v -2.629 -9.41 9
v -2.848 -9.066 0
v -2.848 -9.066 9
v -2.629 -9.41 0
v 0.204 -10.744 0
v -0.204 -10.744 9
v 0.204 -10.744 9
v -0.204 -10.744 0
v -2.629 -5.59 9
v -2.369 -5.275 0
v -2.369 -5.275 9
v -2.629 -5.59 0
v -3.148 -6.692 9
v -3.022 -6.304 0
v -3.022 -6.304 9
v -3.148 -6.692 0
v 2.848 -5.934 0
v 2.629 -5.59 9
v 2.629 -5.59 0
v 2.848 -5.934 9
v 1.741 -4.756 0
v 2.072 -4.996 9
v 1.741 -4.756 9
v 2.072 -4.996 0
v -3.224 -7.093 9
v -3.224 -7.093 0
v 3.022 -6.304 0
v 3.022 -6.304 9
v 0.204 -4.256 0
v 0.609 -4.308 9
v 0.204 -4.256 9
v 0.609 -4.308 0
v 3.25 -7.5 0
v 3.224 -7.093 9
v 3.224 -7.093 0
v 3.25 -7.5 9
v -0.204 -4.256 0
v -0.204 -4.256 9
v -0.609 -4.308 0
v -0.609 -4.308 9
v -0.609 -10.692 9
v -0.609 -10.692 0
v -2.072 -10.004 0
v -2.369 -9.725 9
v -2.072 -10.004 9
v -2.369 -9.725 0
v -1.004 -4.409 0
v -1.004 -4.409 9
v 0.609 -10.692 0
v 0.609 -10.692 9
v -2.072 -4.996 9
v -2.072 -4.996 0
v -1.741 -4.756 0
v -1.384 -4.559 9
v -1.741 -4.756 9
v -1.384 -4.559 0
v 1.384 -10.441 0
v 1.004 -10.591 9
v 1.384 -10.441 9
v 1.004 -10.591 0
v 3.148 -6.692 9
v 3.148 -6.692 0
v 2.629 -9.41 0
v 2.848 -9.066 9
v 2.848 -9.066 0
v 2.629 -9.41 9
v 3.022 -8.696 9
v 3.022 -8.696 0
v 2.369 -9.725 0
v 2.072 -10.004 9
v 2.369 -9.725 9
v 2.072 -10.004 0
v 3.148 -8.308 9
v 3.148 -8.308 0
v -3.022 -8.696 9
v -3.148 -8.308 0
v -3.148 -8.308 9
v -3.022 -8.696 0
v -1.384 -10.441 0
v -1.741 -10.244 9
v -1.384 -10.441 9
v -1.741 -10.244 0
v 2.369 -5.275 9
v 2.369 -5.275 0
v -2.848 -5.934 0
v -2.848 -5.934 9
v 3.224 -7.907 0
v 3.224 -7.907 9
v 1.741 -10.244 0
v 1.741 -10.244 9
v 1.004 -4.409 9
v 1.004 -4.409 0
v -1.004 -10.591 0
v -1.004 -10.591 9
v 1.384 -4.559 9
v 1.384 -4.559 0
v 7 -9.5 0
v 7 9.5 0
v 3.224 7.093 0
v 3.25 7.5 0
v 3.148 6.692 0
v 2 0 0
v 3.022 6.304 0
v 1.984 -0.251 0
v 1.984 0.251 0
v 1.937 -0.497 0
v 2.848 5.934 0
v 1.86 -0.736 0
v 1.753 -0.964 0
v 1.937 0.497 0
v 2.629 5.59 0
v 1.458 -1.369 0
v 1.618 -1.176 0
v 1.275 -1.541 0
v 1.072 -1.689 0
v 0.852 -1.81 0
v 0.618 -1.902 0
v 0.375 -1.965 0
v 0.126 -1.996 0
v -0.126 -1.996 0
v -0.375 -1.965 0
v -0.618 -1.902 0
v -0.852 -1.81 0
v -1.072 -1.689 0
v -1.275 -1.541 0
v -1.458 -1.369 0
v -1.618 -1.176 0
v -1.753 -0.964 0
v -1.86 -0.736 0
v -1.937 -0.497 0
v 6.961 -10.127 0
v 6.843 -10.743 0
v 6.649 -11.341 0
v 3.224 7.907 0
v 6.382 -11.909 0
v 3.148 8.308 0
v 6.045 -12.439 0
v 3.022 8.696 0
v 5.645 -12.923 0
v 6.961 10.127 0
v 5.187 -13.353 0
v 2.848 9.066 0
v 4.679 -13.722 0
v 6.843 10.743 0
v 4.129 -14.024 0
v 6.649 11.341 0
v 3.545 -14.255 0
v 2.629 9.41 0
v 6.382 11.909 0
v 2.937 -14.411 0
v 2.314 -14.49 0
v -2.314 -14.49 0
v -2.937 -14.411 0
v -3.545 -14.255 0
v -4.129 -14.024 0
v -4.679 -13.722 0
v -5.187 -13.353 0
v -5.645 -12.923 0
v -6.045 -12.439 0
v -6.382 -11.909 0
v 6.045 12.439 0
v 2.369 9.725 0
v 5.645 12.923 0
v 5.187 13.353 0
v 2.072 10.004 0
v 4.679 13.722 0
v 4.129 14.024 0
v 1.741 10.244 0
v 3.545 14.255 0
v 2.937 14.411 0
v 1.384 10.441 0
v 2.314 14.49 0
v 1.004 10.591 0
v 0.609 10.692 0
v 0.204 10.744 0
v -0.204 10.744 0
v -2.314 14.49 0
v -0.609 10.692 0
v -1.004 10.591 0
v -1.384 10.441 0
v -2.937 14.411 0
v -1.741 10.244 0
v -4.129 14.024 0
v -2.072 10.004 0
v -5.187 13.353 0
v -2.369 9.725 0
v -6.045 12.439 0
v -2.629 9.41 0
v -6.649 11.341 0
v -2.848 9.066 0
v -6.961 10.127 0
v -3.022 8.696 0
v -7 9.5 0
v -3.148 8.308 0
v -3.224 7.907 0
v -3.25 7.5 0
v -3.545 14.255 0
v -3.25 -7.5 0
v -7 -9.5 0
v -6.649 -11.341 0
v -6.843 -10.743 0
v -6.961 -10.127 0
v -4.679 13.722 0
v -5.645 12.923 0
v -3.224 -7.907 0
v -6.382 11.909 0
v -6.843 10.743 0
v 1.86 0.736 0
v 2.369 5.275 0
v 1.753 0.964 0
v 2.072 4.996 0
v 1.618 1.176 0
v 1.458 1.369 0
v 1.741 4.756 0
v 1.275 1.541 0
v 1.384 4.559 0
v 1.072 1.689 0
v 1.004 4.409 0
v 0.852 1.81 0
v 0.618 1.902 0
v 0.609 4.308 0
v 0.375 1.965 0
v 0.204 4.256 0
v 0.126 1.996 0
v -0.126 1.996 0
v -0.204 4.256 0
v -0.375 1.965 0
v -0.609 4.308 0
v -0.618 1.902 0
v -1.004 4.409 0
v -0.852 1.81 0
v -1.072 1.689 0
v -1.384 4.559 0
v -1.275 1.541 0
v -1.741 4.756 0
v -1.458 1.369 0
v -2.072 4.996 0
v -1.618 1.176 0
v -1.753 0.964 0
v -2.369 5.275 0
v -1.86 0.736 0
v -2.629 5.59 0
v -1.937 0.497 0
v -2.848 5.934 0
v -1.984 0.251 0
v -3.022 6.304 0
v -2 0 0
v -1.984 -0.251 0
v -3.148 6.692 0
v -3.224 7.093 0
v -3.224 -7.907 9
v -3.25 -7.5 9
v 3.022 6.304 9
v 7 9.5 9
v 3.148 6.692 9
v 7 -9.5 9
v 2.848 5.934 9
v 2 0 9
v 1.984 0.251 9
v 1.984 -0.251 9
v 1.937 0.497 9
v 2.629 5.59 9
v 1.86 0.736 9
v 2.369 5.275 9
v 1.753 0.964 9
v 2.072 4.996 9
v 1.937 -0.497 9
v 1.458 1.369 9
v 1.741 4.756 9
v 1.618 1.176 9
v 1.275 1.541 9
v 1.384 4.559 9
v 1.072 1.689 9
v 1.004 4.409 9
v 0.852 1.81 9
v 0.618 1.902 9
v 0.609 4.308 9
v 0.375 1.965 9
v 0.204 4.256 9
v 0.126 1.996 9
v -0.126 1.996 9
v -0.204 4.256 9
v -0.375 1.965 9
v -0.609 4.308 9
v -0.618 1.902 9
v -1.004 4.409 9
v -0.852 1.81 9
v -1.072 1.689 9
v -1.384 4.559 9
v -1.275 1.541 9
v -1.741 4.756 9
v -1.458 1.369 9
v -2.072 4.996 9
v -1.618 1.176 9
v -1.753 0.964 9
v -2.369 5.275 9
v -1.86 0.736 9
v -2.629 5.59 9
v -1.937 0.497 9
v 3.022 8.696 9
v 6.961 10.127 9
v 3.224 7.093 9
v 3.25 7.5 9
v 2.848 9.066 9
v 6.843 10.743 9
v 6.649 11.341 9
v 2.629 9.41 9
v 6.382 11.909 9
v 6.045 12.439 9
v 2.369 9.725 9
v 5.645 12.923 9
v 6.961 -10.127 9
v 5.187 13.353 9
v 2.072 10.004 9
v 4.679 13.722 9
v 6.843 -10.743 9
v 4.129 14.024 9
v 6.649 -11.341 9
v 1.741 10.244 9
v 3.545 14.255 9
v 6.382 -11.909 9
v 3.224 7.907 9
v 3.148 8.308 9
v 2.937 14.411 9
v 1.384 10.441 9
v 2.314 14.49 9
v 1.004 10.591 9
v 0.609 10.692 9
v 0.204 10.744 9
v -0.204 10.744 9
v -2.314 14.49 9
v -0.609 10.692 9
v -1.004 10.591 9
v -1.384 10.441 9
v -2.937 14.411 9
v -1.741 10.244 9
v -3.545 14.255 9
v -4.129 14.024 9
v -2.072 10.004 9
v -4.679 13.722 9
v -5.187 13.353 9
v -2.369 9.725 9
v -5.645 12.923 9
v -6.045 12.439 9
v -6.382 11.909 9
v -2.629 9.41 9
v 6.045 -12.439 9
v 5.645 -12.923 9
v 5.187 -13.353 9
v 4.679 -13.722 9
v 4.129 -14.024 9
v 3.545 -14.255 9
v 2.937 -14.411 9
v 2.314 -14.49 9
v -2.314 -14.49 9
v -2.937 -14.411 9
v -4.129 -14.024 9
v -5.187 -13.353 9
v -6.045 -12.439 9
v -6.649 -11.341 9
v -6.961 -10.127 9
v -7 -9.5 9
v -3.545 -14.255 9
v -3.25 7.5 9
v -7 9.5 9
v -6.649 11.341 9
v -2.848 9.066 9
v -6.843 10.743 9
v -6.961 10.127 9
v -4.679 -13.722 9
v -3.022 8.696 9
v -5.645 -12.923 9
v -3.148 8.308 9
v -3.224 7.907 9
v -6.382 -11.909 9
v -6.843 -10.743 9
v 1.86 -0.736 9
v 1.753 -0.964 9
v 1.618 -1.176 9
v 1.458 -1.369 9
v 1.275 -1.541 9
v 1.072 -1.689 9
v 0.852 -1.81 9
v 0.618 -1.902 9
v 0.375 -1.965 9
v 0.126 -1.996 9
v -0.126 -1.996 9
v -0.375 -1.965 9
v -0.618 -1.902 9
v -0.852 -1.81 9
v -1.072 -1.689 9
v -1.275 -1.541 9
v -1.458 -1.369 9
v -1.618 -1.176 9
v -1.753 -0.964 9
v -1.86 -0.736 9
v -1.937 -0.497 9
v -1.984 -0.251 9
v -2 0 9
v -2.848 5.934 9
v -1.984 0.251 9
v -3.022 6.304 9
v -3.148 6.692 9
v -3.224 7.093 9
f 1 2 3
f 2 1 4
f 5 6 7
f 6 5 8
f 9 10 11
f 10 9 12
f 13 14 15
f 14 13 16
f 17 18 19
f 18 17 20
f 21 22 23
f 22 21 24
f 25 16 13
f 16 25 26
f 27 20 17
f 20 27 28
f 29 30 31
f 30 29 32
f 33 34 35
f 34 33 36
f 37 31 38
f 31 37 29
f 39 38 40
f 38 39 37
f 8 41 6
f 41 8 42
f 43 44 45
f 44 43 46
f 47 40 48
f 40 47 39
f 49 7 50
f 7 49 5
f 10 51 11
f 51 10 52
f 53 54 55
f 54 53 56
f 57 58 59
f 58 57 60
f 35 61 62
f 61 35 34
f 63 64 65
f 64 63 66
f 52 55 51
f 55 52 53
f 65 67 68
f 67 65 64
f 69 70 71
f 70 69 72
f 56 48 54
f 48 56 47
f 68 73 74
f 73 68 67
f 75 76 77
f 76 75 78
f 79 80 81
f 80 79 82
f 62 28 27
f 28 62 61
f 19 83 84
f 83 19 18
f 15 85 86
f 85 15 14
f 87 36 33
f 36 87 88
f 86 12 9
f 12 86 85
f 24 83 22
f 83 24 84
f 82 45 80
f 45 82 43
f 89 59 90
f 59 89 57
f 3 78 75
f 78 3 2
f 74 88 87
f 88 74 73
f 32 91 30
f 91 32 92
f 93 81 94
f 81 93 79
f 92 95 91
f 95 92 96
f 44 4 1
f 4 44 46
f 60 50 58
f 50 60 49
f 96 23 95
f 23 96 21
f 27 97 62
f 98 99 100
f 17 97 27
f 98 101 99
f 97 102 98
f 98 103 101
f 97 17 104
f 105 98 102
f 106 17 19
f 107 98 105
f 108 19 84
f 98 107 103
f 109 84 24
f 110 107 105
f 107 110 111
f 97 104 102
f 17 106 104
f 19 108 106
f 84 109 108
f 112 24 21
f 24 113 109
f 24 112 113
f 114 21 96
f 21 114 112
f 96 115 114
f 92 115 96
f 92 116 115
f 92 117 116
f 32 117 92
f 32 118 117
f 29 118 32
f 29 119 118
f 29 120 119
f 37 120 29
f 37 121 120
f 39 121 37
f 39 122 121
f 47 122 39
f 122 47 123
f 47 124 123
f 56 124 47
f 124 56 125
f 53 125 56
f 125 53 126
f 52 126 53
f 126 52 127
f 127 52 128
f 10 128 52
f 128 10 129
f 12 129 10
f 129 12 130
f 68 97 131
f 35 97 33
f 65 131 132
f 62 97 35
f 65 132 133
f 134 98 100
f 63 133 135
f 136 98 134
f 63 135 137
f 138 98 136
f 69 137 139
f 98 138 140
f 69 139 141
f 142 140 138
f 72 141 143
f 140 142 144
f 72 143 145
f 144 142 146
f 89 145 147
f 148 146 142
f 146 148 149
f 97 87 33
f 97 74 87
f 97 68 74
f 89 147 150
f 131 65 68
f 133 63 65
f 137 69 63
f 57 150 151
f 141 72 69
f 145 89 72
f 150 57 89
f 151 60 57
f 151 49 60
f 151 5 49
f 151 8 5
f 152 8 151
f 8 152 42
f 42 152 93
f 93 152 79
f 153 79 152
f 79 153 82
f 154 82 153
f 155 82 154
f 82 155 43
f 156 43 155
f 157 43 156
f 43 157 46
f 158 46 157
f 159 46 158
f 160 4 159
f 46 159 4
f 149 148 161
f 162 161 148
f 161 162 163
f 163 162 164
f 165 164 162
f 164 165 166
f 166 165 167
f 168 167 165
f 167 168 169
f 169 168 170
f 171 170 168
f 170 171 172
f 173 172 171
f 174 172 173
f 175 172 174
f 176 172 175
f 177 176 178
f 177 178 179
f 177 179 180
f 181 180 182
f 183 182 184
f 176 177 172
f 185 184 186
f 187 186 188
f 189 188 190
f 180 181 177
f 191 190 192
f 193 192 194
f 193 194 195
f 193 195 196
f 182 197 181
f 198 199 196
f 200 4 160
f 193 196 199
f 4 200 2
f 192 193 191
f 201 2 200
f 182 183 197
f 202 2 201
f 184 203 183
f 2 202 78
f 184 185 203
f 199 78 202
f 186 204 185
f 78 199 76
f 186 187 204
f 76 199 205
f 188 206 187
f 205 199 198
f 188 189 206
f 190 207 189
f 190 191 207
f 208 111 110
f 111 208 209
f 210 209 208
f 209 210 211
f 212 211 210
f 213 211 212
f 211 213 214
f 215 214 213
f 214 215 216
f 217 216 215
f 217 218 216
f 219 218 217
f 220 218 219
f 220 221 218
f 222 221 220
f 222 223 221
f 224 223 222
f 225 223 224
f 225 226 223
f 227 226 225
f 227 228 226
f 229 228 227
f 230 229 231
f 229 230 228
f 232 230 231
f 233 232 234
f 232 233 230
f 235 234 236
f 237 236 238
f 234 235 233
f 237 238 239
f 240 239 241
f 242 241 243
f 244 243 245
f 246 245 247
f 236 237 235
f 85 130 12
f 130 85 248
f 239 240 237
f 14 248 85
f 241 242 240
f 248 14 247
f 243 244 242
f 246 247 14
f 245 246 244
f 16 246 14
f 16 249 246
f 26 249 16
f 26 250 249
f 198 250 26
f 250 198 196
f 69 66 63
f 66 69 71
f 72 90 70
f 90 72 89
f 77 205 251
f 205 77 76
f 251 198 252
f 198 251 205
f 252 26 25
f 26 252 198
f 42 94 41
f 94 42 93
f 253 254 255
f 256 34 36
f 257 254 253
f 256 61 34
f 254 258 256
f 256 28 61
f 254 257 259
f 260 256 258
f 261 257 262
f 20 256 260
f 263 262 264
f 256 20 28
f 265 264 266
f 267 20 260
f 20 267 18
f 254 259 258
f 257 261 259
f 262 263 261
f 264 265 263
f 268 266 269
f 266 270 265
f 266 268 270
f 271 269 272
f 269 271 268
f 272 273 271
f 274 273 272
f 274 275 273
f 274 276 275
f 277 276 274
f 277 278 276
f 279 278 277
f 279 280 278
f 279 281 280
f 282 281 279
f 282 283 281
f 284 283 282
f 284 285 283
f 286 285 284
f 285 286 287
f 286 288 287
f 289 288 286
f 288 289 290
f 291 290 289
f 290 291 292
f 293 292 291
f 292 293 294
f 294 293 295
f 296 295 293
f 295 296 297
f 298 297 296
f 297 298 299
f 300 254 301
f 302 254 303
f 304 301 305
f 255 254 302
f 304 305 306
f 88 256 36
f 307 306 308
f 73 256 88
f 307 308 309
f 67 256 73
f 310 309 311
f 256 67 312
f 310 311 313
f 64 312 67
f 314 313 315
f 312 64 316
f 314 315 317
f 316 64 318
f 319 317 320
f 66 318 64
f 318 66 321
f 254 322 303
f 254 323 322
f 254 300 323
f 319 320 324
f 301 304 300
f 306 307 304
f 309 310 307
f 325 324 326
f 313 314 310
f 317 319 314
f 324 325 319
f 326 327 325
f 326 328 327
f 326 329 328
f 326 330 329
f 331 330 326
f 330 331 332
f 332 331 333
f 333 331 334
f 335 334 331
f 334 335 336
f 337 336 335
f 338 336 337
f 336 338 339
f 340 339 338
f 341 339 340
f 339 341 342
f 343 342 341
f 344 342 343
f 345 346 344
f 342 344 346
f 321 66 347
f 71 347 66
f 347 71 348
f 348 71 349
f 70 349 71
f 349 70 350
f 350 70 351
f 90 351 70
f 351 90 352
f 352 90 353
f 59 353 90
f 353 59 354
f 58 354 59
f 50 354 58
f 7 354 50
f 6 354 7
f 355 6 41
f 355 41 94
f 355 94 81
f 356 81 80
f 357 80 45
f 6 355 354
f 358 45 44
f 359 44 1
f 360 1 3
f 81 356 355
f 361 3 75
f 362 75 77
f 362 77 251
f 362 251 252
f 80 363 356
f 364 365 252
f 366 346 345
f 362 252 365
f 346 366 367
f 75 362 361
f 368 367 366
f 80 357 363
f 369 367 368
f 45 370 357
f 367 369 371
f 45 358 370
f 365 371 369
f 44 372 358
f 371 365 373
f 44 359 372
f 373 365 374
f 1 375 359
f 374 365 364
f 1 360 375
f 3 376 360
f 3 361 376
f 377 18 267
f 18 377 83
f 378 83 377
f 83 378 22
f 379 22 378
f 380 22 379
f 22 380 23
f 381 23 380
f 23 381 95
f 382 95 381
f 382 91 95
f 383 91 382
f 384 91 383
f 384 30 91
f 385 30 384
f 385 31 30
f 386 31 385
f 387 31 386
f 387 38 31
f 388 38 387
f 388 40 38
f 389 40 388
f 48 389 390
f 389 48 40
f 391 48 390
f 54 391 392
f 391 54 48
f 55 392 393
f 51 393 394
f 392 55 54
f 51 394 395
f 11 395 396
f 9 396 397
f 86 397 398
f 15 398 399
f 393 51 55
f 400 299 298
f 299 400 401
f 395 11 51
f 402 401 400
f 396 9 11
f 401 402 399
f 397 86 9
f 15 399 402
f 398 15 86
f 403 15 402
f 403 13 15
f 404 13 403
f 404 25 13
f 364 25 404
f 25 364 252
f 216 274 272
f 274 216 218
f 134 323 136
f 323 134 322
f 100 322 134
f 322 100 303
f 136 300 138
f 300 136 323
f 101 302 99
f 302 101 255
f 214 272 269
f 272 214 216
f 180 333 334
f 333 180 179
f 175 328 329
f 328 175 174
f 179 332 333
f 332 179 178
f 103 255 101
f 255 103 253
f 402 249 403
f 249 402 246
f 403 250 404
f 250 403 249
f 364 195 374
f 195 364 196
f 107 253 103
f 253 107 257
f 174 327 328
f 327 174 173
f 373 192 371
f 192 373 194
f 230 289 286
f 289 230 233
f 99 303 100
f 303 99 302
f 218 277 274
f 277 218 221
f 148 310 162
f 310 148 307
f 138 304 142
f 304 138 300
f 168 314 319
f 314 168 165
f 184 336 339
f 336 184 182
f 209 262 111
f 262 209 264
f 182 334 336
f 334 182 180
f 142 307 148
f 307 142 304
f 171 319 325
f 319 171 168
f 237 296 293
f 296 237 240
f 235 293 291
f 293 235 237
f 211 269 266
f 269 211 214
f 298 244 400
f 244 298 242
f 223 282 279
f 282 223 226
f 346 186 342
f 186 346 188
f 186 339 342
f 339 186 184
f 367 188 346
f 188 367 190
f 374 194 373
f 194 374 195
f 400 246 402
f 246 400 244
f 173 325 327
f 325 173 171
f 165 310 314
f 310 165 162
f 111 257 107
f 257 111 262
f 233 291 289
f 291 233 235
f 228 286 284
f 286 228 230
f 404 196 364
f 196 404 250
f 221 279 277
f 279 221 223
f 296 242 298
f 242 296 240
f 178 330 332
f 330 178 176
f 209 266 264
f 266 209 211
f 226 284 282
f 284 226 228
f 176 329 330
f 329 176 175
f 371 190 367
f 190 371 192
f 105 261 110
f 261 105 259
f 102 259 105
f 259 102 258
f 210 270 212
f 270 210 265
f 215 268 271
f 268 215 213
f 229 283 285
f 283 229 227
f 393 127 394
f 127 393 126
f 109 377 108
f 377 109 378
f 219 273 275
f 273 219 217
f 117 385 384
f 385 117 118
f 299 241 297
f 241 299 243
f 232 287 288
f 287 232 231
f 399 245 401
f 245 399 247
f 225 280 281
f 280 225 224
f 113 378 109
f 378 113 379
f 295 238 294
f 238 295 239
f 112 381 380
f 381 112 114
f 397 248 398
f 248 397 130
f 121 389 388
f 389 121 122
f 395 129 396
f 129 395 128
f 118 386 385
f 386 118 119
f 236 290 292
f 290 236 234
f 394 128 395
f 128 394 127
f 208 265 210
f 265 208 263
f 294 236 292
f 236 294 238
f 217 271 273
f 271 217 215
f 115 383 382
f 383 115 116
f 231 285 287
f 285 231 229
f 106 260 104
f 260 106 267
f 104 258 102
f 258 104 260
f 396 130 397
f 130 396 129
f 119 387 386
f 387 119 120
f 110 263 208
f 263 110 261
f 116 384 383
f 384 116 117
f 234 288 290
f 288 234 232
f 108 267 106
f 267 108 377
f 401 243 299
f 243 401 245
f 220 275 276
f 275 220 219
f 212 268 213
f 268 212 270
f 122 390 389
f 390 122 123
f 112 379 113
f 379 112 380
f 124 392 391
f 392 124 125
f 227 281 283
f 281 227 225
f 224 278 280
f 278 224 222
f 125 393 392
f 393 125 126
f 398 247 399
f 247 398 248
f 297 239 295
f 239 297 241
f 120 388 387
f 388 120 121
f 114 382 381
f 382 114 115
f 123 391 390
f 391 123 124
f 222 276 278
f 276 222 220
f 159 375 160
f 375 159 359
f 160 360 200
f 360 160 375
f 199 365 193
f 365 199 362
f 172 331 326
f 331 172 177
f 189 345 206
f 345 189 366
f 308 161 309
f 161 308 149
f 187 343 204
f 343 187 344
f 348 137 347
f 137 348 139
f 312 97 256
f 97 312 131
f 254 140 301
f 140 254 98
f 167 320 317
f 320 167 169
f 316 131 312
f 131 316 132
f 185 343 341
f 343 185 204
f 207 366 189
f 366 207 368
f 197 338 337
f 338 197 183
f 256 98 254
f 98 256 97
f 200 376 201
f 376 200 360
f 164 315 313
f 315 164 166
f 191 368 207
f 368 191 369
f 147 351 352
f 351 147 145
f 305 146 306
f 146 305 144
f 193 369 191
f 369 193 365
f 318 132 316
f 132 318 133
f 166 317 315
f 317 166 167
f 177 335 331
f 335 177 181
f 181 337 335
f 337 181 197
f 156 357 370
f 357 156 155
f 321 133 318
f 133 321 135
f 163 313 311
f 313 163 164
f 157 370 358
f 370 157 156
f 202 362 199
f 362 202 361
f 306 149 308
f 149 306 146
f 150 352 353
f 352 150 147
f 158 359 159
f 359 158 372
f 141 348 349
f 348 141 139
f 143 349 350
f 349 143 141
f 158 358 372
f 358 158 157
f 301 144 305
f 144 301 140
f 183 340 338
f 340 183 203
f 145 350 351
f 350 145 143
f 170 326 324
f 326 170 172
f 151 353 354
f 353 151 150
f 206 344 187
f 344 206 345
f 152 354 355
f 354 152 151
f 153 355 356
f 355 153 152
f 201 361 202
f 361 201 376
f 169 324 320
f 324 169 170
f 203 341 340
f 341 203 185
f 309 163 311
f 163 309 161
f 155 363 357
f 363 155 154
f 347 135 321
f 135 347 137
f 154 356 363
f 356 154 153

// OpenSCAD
$fn = 50;

difference() {
	union() {
		hull() {
			translate(v = [-2.0, 9.5, 0]) {
				cylinder(h = 9, r = 5);
			}
			translate(v = [2.0, 9.5, 0]) {
				cylinder(h = 9, r = 5);
			}
			translate(v = [-2.0, -9.5, 0]) {
				cylinder(h = 9, r = 5);
			}
			translate(v = [2.0, -9.5, 0]) {
				cylinder(h = 9, r = 5);
			}
		}
	}
	union() {
		translate(v = [0.0, -7.5, 0]) {
			cylinder(h = 9, r = 3.25);
		}
		translate(v = [0.0, 7.5, 0]) {
			cylinder(h = 9, r = 3.25);
		}
		cylinder(h = 9, r = 2.0);
	}
}
